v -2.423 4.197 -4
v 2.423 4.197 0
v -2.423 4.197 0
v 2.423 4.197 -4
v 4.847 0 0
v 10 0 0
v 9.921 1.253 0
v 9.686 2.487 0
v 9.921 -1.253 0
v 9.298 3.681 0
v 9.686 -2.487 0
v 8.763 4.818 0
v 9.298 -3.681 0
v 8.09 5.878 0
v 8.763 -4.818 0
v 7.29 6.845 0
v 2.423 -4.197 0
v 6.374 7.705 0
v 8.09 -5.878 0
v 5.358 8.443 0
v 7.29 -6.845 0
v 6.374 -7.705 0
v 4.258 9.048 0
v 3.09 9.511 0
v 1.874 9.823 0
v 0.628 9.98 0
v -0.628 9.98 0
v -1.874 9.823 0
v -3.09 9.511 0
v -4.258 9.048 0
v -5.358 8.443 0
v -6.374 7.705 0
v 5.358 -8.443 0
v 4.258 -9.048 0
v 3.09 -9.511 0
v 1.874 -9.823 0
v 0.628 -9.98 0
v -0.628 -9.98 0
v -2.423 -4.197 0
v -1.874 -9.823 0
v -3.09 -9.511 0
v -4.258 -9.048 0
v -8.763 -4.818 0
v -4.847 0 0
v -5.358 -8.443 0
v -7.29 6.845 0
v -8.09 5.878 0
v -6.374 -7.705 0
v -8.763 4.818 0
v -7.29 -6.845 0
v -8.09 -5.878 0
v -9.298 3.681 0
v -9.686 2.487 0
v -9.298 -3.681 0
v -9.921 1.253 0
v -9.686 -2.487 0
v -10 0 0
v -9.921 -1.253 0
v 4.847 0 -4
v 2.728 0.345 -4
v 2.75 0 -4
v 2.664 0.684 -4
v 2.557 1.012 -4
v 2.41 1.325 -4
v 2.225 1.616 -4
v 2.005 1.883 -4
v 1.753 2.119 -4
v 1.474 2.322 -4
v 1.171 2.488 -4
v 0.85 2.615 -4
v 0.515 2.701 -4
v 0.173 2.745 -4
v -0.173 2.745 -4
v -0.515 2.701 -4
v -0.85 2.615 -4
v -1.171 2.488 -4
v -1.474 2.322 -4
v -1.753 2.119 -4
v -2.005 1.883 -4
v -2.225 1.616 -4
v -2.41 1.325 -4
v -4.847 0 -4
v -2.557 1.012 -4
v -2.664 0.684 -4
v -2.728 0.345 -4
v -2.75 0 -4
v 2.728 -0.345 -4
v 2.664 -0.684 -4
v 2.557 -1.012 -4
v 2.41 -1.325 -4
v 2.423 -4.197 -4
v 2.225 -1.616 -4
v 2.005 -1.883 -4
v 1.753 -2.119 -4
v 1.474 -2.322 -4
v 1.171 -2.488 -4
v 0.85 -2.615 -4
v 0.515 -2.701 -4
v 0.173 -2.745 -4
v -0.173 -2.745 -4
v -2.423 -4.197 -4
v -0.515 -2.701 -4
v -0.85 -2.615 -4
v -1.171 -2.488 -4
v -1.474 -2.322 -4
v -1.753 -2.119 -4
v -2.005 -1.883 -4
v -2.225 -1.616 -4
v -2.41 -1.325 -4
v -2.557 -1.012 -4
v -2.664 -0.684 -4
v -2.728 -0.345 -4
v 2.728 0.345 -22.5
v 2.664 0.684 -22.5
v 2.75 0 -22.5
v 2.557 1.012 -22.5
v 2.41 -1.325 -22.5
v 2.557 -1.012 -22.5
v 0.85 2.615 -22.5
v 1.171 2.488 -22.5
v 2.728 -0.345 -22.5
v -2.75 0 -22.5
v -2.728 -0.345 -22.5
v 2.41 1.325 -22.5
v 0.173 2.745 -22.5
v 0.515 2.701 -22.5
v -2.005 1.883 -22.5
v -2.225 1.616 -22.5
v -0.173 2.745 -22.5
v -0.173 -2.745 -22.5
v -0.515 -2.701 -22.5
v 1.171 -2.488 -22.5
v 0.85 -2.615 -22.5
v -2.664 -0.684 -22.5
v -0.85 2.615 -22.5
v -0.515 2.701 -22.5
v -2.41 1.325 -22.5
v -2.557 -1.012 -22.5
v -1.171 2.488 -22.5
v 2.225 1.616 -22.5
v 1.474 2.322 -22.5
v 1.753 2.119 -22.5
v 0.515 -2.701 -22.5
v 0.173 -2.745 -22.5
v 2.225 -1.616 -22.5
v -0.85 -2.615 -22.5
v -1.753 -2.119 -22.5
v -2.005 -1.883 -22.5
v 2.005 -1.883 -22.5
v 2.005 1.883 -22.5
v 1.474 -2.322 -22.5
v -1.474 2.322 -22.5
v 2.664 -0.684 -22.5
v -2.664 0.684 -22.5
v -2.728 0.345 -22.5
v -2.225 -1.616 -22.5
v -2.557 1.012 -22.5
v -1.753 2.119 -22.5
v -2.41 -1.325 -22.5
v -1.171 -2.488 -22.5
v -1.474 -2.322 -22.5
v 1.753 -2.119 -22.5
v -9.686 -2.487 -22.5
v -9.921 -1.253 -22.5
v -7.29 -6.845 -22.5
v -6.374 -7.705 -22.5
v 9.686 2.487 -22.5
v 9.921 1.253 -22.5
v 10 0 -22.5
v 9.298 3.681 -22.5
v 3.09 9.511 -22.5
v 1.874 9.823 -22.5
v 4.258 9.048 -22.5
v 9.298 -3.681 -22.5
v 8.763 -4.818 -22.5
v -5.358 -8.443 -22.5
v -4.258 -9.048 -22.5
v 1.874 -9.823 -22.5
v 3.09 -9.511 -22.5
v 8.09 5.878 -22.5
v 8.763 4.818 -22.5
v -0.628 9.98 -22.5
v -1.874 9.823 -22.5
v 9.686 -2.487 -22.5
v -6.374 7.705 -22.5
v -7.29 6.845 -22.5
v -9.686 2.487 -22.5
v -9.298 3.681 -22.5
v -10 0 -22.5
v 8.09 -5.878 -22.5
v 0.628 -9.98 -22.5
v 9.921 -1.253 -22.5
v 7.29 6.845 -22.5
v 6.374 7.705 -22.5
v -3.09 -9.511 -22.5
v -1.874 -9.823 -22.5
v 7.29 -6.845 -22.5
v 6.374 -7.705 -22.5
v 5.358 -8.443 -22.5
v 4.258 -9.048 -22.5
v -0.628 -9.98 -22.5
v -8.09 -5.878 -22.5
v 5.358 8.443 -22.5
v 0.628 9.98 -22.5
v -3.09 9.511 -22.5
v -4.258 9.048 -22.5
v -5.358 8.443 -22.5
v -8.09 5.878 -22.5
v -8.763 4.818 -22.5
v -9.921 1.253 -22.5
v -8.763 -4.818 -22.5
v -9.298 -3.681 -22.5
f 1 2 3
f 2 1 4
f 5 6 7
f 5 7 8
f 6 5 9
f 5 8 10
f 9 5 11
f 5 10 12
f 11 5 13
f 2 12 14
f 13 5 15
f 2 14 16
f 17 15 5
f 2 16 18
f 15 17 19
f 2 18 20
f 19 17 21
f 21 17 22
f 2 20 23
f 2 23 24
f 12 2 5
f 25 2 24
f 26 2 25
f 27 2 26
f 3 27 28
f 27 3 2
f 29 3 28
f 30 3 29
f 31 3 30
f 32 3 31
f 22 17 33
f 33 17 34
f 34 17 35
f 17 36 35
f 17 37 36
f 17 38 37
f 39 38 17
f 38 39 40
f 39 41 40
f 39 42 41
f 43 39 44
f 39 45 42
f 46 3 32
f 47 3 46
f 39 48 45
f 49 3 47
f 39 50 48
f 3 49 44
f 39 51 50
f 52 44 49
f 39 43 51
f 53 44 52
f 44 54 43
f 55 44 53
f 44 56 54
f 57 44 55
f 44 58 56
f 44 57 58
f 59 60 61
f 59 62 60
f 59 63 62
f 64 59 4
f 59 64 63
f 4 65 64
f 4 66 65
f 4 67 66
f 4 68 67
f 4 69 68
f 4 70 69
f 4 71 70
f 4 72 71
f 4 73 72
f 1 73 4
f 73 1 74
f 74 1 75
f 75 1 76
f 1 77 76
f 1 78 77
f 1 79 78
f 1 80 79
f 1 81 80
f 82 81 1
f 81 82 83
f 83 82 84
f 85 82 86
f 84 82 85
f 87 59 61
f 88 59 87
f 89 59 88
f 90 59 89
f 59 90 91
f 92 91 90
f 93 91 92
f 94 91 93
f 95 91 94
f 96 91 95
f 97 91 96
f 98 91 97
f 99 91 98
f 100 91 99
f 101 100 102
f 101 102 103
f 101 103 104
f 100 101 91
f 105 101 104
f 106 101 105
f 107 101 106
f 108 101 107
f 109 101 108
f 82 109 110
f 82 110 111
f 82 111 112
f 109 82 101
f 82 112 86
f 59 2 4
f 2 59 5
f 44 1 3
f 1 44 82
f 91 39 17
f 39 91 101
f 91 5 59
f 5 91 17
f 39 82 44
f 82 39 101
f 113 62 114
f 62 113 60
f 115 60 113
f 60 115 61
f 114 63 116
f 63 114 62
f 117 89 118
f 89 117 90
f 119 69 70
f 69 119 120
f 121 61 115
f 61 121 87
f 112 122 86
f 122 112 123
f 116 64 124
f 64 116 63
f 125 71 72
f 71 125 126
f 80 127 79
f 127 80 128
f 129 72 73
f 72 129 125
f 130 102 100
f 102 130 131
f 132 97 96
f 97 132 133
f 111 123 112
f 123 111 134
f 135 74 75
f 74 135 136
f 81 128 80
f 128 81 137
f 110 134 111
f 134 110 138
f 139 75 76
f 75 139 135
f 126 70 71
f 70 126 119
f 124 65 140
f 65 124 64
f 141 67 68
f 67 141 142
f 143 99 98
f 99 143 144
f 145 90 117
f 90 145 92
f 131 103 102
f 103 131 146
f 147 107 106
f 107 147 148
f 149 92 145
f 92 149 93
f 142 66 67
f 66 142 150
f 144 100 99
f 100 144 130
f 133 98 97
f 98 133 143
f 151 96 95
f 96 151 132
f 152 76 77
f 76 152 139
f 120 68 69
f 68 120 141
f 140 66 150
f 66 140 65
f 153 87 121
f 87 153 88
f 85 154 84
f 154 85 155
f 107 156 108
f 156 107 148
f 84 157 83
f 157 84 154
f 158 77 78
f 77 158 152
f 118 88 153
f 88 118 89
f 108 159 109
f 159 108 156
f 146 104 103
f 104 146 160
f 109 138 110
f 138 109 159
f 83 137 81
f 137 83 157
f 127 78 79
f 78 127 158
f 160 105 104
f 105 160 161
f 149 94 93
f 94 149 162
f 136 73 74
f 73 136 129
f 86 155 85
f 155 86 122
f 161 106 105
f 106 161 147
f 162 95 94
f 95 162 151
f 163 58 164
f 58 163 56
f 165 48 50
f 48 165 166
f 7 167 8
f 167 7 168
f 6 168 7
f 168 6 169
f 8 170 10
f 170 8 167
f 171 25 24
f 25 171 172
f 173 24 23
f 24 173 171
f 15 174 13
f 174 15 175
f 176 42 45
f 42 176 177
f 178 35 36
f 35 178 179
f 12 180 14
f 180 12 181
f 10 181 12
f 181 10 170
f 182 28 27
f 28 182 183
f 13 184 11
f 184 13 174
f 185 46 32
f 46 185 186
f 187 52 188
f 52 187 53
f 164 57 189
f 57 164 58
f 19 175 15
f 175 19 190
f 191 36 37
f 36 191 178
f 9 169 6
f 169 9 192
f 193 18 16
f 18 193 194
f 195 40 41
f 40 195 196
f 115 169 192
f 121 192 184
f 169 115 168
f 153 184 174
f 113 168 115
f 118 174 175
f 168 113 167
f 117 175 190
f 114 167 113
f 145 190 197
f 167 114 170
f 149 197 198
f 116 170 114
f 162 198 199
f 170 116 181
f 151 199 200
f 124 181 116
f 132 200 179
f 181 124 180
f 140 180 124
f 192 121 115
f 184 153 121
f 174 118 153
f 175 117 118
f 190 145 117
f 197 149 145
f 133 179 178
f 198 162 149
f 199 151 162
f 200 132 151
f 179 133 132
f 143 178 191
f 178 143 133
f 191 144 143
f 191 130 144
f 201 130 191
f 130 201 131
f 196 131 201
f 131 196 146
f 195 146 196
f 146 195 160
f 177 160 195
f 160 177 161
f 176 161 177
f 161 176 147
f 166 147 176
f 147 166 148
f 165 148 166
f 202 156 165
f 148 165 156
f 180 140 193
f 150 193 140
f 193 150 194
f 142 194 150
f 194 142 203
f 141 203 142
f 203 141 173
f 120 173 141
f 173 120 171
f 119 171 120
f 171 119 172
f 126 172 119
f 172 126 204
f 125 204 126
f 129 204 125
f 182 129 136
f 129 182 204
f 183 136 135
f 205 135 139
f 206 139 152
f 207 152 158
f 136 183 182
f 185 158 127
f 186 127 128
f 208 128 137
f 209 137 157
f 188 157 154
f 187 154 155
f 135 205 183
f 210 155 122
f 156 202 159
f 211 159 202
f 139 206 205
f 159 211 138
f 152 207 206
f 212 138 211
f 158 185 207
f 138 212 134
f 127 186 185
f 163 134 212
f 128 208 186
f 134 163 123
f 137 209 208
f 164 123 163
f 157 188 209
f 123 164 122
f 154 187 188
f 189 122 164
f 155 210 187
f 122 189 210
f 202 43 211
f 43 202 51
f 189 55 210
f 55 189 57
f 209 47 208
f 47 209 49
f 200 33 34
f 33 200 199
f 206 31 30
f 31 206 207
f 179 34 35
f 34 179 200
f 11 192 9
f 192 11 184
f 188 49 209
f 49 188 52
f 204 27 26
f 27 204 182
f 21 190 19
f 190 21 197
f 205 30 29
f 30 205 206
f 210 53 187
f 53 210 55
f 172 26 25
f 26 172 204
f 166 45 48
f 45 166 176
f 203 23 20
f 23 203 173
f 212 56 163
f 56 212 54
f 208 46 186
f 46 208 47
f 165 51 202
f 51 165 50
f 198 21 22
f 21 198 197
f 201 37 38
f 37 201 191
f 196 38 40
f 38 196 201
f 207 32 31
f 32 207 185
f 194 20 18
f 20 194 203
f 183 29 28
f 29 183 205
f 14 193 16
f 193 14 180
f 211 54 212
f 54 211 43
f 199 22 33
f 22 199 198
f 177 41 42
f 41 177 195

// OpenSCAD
$fn = 50;

difference() {
	union() {
		translate(v = [0, 0, -22.5]) {
			cylinder(h = 22.5, r = 10.0);
		}
	}
	union() {
		translate(v = [0, 0, 0]) {
			rotate(a = [0, 0, 0]) {
				difference() {
					union() {
						translate(v = [0, 0, -4]) {
							linear_extrude(height = 4) {
								polygon(points = [[4.8468, 0.0], [2.4234000000000004, 4.197451927062417], [-2.423399999999999, 4.197451927062417], [-4.8468, 5.935618106107392e-16], [-2.423400000000002, -4.197451927062416], [2.423399999999997, -4.197451927062419]]);
							}
						}
					}
					union();
				}
			}
		}
		#translate(v = [0, 0, -100.0]) {
			cylinder(h = 200, r = 2.75);
		}
	}
}
